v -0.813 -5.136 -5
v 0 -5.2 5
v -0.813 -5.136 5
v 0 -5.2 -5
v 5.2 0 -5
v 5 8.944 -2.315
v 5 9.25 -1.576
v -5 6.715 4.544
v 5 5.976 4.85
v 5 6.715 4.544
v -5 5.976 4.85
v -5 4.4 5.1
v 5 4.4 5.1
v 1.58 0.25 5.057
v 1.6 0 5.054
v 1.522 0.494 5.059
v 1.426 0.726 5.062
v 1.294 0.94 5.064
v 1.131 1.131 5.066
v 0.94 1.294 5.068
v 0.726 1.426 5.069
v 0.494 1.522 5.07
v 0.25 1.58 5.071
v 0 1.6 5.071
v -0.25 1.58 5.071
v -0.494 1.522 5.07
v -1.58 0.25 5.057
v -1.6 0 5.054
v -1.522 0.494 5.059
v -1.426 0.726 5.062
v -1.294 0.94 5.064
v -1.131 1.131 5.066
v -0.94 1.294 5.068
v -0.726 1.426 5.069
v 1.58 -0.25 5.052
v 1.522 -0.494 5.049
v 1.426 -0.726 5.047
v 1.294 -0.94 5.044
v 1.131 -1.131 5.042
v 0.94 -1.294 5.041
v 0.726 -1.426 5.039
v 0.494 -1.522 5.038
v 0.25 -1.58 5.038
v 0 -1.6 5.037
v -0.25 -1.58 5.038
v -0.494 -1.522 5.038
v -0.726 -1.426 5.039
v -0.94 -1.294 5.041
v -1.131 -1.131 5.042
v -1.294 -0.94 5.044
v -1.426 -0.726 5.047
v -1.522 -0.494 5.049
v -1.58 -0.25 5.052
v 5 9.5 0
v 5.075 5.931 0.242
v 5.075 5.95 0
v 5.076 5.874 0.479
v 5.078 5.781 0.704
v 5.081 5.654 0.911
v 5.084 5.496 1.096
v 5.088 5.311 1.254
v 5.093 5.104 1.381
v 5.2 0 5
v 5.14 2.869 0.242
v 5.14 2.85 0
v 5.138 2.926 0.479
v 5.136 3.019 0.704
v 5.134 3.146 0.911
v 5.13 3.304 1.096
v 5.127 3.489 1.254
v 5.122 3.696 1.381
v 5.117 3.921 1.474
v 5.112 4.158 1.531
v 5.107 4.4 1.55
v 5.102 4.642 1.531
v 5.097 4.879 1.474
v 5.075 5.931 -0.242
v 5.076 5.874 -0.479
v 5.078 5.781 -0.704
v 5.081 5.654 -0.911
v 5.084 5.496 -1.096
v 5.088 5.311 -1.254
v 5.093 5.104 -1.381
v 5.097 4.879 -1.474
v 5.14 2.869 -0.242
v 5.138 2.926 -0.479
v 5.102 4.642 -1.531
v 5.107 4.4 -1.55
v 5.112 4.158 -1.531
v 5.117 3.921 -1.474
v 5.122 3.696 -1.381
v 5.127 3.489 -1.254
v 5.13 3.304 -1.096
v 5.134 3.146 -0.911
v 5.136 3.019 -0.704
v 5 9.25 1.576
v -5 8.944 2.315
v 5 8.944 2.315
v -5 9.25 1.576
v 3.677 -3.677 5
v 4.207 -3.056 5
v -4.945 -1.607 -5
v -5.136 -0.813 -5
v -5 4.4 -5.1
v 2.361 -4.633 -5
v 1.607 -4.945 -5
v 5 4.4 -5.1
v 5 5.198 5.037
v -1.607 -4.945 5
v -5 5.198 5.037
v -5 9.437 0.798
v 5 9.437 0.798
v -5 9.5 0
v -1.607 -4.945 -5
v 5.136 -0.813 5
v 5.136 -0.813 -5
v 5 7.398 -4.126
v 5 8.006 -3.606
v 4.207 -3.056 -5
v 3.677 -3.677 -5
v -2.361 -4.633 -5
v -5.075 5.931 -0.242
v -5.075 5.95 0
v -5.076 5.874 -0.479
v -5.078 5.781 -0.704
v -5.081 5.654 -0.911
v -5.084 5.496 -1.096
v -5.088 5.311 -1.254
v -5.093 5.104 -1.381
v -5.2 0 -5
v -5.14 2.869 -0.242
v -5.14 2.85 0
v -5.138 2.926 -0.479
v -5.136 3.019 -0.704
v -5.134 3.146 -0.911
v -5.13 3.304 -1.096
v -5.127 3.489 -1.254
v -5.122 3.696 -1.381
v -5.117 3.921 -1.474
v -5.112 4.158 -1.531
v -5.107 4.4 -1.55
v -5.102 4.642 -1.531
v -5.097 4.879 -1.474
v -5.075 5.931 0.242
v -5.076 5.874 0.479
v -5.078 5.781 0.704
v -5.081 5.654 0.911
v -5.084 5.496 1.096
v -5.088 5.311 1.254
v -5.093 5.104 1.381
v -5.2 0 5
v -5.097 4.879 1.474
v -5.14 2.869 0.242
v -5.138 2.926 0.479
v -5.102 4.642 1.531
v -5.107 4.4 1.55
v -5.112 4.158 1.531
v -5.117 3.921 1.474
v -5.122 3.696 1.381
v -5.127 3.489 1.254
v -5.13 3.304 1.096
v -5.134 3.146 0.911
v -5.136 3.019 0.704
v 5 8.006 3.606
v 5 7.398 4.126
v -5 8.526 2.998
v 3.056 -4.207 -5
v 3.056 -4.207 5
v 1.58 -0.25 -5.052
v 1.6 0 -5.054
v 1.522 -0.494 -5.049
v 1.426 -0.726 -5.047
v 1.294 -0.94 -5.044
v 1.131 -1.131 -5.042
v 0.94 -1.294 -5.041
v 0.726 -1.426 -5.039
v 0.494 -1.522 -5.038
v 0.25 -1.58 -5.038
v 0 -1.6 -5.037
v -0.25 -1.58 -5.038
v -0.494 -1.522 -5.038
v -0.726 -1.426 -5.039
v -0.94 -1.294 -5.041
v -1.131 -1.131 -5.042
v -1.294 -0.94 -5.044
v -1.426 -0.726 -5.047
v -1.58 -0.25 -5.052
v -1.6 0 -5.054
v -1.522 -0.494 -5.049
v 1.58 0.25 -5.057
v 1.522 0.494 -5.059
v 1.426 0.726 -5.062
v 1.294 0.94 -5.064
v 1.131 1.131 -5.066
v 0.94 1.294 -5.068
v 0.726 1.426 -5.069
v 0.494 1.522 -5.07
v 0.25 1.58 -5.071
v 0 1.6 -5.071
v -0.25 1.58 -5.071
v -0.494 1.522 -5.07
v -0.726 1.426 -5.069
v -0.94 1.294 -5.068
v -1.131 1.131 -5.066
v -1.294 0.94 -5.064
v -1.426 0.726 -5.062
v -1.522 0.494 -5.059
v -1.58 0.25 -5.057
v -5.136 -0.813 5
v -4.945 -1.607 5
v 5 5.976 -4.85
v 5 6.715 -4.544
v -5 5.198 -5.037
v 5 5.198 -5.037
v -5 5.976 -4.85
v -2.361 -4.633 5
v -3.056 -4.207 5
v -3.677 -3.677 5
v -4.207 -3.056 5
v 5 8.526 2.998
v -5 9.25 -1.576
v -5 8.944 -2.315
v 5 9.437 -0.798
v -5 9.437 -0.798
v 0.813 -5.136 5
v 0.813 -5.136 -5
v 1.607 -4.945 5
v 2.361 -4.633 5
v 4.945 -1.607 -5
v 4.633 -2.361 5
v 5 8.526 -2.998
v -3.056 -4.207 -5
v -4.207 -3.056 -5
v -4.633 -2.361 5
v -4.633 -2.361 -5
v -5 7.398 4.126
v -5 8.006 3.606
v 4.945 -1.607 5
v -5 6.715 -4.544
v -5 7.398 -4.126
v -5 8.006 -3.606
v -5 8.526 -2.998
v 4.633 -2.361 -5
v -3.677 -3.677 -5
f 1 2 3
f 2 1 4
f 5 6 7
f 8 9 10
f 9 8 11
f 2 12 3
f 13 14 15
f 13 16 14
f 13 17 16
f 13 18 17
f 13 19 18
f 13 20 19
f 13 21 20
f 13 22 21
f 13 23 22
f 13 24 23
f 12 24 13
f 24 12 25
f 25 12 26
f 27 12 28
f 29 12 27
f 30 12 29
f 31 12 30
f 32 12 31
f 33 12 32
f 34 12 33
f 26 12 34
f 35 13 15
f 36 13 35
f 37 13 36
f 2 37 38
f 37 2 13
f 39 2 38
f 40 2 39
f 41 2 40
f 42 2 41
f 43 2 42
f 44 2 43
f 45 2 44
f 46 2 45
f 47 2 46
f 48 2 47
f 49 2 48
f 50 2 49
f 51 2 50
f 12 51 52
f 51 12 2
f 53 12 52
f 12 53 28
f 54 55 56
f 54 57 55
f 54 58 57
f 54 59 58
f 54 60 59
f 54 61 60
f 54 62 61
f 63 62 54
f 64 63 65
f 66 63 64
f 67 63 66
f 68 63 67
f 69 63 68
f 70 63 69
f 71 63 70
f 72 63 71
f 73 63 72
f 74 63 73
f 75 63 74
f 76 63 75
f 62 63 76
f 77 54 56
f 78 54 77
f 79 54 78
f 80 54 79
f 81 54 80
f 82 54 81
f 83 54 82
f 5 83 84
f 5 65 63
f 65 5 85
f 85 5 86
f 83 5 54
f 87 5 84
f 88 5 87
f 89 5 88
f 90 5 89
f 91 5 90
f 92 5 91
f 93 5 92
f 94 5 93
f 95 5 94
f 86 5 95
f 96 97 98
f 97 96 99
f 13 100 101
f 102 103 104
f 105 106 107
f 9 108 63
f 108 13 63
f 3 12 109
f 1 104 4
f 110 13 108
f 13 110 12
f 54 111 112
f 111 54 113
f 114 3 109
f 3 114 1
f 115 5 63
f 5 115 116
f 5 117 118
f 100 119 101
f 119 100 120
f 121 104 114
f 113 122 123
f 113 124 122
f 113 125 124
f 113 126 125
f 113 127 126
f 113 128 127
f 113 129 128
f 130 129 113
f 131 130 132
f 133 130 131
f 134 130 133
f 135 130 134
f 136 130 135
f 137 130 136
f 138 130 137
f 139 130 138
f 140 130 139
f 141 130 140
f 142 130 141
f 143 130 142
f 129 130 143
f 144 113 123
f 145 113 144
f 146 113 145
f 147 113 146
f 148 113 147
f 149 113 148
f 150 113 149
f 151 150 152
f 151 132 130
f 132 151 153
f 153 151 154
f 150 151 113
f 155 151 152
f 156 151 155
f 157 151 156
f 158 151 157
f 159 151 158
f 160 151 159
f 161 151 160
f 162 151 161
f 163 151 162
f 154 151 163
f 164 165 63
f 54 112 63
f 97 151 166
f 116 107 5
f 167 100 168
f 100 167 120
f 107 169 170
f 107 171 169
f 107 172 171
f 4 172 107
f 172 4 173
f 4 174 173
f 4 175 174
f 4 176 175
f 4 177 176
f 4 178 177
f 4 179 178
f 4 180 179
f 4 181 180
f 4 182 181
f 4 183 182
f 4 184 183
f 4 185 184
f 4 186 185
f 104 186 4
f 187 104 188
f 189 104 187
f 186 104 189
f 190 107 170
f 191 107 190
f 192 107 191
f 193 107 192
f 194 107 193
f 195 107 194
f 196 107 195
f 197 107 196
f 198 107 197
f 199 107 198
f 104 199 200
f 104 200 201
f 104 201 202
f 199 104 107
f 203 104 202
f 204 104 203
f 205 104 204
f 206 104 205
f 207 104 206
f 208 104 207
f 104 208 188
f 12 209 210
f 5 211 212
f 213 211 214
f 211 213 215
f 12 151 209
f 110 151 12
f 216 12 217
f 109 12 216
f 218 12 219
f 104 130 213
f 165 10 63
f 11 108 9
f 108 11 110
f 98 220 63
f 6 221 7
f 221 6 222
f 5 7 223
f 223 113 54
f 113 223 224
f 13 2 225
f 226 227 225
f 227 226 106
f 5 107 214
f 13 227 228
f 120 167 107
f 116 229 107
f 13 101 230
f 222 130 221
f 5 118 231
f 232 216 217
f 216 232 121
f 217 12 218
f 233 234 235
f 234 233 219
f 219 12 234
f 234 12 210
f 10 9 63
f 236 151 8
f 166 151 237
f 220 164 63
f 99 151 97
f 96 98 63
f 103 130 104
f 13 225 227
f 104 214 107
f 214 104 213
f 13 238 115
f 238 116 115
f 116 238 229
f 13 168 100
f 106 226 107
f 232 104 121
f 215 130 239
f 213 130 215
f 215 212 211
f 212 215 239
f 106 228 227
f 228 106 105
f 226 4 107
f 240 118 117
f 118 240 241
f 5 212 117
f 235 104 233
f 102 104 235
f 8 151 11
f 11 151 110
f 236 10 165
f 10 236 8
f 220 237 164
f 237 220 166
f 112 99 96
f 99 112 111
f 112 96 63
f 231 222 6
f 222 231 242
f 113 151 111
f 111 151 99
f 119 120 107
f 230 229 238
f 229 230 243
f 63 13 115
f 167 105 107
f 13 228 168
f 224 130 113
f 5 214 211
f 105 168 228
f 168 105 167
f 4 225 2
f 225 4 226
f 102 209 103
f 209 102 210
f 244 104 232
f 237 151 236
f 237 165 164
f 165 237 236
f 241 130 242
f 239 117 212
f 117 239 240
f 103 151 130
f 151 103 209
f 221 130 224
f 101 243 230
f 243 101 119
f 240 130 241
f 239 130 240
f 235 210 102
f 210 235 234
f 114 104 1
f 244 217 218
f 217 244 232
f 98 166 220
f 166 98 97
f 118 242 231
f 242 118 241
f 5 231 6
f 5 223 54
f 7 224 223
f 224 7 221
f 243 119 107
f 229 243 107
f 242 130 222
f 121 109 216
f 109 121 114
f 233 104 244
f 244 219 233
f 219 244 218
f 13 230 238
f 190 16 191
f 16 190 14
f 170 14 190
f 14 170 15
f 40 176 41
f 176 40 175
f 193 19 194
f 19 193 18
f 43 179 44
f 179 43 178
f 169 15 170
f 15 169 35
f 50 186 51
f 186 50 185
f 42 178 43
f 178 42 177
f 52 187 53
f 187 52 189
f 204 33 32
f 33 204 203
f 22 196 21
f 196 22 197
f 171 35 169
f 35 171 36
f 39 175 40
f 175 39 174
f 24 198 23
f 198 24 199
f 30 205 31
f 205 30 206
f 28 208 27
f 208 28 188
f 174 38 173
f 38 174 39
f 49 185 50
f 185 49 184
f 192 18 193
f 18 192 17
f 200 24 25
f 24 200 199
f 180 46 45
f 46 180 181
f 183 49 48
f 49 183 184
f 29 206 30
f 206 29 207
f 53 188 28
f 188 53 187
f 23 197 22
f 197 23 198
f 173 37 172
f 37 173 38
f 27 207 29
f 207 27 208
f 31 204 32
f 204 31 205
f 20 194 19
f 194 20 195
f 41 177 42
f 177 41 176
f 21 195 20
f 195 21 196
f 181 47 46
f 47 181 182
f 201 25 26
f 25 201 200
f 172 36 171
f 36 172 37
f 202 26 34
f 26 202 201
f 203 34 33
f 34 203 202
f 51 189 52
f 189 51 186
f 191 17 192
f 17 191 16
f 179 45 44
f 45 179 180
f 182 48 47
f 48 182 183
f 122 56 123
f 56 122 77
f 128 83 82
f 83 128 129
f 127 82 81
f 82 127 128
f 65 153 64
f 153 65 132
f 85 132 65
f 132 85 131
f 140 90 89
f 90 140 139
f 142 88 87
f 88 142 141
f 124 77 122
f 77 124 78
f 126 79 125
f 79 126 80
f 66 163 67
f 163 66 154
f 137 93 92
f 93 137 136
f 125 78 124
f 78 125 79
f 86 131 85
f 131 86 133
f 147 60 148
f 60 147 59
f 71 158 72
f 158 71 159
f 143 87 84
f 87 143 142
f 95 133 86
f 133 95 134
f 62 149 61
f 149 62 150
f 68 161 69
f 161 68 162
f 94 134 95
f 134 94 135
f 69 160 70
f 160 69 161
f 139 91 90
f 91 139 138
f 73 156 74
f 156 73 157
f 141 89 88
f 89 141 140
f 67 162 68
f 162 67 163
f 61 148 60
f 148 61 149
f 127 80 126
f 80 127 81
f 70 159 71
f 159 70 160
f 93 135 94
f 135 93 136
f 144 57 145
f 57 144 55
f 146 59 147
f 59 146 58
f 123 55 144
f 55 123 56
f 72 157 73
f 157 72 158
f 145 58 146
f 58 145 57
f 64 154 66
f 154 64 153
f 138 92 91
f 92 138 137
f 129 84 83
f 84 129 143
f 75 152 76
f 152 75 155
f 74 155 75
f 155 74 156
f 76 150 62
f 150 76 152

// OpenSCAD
CABLE = 3.2;
AXLE = 3.1;

$fn = 40;

module cable_whatever() {
    difference() {
        cylinder(h=10, d=CABLE*2+4, center=true);
        //cylinder(h=5.1, d=CABLE, center=true);
    }
}

module other_thing() {
    difference() {
        cylinder(h=10, d=AXLE*2+4, center=true);
        //cylinder(h=5.1, d=AXLE, center=true);
    }
}

module cable_whatever_neg() {
    cylinder(h=12, d=CABLE, center=true);
}

module other_thing_neg() {
    cylinder(h=12, d=AXLE, center=true);
}

module hinge() {
    difference() {
        hull() {
            cable_whatever();
            translate([0,CABLE*2-2,0])
                rotate([0, 90])
                     other_thing();
        }
        cable_whatever_neg();
        translate([0,CABLE*2-2,0])
            rotate([0, 90])
                 other_thing_neg();
    }
}

hinge();
